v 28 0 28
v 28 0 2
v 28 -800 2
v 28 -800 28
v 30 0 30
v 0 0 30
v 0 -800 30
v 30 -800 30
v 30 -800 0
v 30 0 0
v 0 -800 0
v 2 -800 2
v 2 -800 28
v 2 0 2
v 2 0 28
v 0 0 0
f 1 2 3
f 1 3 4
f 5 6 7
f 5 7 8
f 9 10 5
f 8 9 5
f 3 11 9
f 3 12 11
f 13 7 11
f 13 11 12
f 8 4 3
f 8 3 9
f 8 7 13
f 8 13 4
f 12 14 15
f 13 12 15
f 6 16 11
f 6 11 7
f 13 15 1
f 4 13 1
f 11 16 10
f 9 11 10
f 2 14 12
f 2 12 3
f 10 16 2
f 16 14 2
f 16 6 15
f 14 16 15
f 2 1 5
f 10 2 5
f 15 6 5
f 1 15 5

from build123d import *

# Parameters (mm, degrees)
SKETCH_W   = 30
SKETCH_H   = 30
SKETCH_W_2 = 26
SKETCH_H_2 = 26
PAD_DEPTH  = 800


with BuildPart() as part:
    # Sketch → Pad (new body)
    with BuildSketch(Plane.XZ):
        with Locations((15, 15)):
            Rectangle(SKETCH_W, SKETCH_H)
        with Locations((15, 15)):
            Rectangle(SKETCH_W_2, SKETCH_H_2, mode=Mode.SUBTRACT)
    extrude(amount=PAD_DEPTH)


solid = part.part
